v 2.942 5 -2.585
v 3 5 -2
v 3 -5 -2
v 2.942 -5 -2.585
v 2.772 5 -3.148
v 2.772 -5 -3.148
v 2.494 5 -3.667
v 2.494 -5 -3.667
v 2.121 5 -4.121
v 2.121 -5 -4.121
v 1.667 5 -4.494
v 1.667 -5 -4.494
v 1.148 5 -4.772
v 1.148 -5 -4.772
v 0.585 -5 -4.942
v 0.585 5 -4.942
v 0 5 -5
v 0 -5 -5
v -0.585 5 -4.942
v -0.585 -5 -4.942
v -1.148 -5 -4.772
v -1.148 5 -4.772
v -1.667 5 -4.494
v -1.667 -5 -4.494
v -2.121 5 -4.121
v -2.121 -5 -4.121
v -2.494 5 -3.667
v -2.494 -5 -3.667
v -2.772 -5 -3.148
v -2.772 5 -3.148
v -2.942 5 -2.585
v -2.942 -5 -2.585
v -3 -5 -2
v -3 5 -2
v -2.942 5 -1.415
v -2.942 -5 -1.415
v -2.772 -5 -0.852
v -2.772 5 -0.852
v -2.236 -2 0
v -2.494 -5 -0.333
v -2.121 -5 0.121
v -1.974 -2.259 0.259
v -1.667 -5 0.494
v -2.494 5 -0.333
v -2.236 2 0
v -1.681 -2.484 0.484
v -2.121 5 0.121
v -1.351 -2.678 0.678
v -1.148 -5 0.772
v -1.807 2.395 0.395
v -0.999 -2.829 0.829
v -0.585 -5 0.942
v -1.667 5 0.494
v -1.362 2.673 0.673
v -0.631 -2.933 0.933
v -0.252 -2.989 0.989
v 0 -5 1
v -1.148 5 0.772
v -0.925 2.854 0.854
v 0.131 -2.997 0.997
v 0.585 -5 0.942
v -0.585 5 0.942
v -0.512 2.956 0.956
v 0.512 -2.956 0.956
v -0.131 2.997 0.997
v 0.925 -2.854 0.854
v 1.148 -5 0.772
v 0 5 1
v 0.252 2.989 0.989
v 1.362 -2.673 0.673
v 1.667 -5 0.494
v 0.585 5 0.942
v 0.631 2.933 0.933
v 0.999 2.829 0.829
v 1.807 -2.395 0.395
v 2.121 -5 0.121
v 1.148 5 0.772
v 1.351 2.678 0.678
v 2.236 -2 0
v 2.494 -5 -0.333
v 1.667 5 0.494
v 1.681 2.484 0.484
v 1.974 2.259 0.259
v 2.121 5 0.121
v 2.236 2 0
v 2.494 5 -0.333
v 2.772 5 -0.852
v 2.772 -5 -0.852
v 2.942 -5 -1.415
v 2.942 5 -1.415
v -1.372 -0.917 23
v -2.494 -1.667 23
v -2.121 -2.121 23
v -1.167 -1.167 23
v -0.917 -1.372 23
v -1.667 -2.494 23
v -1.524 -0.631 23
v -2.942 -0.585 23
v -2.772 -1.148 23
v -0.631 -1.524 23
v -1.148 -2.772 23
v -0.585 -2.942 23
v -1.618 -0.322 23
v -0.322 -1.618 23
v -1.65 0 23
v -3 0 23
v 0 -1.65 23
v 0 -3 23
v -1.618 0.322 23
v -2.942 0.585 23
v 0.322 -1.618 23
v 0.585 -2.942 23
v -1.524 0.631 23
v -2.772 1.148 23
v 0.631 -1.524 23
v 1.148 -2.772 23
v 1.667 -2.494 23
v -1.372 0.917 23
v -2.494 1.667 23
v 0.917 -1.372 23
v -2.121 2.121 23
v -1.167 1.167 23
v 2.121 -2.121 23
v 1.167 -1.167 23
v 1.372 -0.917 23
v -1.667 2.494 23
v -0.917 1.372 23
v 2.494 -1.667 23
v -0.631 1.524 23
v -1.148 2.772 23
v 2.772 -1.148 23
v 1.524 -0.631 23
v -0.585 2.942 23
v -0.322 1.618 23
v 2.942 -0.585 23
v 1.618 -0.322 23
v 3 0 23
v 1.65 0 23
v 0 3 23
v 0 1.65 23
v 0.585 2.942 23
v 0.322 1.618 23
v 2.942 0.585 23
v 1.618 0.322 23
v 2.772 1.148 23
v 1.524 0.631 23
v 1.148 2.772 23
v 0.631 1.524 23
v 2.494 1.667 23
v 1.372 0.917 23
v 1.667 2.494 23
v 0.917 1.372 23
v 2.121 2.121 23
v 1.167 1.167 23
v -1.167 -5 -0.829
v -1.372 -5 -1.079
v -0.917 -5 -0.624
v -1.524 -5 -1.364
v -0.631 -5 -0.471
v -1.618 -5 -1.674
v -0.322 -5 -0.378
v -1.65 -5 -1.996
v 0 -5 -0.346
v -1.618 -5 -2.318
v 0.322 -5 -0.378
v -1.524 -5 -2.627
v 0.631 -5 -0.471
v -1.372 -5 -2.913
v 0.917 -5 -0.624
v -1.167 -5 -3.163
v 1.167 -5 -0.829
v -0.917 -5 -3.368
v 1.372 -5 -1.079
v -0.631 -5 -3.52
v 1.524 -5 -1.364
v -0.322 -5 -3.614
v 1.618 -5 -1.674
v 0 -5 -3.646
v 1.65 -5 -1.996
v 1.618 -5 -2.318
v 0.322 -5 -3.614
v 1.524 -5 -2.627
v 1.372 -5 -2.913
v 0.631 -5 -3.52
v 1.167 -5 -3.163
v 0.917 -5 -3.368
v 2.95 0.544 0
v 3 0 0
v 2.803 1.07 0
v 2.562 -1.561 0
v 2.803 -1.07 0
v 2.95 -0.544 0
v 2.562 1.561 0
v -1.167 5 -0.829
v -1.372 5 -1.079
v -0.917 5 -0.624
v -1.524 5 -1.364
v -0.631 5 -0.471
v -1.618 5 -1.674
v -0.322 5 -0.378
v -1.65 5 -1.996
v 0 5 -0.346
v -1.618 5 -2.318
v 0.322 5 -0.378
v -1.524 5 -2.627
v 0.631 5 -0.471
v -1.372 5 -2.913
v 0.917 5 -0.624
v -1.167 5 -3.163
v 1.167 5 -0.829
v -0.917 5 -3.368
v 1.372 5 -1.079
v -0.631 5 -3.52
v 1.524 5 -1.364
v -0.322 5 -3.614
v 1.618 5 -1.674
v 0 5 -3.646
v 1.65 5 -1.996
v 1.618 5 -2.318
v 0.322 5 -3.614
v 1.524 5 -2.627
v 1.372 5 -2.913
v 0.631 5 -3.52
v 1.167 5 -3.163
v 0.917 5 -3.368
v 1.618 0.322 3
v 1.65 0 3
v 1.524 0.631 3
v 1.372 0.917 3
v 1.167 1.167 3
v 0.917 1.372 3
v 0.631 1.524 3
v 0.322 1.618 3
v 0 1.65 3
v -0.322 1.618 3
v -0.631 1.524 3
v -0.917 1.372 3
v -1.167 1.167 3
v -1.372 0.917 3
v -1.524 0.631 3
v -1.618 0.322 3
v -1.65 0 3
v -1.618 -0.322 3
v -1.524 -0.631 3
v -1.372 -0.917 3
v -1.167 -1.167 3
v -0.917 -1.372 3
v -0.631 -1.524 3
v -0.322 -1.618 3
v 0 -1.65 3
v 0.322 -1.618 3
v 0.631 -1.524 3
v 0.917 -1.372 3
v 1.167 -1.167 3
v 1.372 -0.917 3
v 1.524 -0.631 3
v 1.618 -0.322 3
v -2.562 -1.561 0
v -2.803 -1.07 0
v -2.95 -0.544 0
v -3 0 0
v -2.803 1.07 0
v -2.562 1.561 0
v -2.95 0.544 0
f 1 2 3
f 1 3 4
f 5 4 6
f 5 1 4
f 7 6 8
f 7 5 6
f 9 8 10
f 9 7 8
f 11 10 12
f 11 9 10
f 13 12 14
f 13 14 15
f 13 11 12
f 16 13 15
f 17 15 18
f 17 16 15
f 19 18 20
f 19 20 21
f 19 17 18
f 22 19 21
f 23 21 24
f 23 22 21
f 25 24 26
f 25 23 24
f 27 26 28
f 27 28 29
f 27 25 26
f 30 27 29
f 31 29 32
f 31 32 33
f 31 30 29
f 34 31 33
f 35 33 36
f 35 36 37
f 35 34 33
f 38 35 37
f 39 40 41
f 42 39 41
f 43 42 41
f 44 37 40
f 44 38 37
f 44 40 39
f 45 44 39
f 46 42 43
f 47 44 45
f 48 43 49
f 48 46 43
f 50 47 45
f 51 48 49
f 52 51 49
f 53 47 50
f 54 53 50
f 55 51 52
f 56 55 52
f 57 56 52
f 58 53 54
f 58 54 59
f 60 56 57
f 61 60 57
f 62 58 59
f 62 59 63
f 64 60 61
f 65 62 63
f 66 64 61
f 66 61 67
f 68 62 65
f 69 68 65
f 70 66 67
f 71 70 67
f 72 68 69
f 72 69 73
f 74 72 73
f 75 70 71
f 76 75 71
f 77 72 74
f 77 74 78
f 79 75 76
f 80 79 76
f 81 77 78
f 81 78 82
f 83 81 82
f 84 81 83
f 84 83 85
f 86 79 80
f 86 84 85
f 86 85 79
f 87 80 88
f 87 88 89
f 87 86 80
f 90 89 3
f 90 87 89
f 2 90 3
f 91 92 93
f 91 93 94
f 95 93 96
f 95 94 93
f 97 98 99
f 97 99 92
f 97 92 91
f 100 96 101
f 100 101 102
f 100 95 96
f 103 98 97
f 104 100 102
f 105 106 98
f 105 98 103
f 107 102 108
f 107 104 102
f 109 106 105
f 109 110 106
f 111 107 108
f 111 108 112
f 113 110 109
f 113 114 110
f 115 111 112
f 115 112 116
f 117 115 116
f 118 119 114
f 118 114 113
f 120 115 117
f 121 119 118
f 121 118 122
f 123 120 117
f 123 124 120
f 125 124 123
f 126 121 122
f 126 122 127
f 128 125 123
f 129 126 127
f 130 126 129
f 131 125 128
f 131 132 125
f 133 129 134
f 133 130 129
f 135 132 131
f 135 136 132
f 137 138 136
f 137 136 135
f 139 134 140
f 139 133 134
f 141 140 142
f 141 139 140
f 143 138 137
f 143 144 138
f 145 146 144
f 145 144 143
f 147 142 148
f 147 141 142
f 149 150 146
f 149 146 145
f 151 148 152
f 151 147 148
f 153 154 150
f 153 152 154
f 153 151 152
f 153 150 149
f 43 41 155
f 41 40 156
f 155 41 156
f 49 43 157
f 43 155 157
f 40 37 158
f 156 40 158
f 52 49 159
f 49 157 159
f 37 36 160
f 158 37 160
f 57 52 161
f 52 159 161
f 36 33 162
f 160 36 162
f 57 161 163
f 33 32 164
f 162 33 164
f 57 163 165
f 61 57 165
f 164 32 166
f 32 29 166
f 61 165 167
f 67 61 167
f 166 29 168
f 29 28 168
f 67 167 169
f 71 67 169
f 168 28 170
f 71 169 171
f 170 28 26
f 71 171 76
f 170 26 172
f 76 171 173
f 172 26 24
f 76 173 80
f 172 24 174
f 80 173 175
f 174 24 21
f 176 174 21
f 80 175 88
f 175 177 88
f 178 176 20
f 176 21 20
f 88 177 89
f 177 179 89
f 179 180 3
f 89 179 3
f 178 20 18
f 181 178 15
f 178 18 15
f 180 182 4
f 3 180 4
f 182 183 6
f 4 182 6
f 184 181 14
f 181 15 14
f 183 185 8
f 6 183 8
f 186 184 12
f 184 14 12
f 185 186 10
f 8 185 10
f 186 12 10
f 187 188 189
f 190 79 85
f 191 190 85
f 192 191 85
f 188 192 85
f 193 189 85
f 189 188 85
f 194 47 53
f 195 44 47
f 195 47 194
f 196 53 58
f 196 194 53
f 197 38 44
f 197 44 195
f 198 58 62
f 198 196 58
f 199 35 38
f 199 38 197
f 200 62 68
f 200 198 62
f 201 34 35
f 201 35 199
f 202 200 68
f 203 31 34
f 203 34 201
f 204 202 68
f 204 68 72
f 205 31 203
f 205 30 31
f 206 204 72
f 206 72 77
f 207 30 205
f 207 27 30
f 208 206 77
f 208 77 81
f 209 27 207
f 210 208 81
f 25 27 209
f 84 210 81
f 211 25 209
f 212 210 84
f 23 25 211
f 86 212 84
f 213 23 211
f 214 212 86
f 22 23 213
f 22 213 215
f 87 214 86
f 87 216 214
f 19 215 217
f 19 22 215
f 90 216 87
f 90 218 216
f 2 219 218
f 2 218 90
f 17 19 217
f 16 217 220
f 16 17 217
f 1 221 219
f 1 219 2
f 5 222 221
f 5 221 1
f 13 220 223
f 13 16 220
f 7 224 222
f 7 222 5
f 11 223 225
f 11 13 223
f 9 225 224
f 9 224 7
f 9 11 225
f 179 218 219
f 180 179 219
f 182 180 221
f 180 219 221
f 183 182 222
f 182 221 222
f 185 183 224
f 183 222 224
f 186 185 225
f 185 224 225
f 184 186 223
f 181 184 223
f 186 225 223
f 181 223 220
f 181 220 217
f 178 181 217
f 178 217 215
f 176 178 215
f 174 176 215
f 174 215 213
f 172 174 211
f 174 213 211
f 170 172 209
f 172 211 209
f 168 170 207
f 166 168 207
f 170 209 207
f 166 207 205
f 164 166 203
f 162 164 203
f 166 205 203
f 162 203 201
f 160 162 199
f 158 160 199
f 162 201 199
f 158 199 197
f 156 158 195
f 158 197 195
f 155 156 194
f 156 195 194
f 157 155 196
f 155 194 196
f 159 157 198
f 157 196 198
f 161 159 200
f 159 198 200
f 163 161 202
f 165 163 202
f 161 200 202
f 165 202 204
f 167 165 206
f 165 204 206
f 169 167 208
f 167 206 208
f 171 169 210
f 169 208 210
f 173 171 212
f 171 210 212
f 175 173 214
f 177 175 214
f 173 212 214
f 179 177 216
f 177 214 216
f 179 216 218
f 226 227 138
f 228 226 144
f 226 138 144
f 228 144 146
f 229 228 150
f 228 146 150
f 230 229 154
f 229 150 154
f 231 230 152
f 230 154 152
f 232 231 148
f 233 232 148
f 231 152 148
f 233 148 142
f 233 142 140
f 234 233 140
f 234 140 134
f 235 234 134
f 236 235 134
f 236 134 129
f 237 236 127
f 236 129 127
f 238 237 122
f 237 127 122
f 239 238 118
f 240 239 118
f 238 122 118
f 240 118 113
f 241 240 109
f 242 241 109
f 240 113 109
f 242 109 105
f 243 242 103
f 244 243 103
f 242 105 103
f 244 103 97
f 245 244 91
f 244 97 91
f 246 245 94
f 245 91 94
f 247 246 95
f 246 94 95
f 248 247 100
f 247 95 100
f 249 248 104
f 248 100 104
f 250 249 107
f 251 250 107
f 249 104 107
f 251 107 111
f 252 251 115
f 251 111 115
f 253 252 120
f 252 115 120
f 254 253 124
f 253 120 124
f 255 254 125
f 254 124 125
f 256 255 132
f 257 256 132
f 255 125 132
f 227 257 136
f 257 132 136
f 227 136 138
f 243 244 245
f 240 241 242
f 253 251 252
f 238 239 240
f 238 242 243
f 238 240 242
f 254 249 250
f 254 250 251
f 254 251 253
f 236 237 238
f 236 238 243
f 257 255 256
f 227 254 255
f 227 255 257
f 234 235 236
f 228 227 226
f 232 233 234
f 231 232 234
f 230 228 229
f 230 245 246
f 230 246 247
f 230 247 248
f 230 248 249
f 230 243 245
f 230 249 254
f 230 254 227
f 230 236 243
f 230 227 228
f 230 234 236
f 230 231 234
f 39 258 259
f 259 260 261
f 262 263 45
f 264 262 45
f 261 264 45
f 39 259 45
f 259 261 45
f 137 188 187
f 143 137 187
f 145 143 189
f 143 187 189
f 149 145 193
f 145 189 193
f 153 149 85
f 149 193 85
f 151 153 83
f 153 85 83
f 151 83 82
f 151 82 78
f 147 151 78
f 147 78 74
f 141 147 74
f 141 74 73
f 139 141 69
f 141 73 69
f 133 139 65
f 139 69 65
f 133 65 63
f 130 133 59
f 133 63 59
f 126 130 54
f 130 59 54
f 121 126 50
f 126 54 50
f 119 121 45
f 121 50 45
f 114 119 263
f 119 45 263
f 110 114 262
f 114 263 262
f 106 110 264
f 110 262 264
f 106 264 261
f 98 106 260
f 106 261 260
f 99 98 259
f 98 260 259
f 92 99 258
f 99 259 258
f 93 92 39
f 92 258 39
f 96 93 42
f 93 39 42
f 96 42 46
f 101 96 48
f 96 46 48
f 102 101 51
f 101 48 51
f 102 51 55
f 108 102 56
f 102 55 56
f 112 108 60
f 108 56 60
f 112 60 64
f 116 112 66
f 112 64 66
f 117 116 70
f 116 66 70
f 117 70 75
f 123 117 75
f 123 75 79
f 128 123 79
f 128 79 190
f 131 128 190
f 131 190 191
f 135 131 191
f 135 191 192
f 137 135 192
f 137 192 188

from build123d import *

# Parameters (mm, degrees)
SKICA1_R                 = 3
P_IDAT_VYSUNUT_M1_DEPTH  = 23
SKICA2_R                 = 1.65
ODEBRAT_VYSUNUT_M1_DEPTH = 20
SKICA3_R                 = 3
P_IDAT_VYSUNUT_M2_DEPTH  = 5
SKICA4_R                 = 1.65
ODEBRAT_VYSUNUT_M2_DEPTH = 10


with BuildPart() as part:
    # Skica1 → Přidat vysunutím1 (new body)
    with BuildSketch(Plane.XY):
        Circle(SKICA1_R)
    extrude(amount=P_IDAT_VYSUNUT_M1_DEPTH)

    # Skica2 → Odebrat vysunutím1 (cut)
    with BuildSketch(Plane.XY.offset(23)):
        Circle(SKICA2_R)
    extrude(amount=-ODEBRAT_VYSUNUT_M1_DEPTH, mode=Mode.SUBTRACT)

    # Skica3 → Přidat vysunutím2 (add, symmetric)
    with BuildSketch(Plane(origin=(0, 0, 0), x_dir=(1, 0, 0), z_dir=(0, 1, 0))):
        with Locations((0, 2)):
            Circle(SKICA3_R)
    extrude(amount=P_IDAT_VYSUNUT_M2_DEPTH, both=True)

    # Skica4 → Odebrat vysunutím2 (cut)
    with BuildSketch(Plane(origin=(0, 5, 0), x_dir=(1, 0, 0), z_dir=(0, 1, 0))):
        with Locations((0, 1.995839667)):
            Circle(SKICA4_R)
    extrude(amount=-ODEBRAT_VYSUNUT_M2_DEPTH, mode=Mode.SUBTRACT)


solid = part.part
